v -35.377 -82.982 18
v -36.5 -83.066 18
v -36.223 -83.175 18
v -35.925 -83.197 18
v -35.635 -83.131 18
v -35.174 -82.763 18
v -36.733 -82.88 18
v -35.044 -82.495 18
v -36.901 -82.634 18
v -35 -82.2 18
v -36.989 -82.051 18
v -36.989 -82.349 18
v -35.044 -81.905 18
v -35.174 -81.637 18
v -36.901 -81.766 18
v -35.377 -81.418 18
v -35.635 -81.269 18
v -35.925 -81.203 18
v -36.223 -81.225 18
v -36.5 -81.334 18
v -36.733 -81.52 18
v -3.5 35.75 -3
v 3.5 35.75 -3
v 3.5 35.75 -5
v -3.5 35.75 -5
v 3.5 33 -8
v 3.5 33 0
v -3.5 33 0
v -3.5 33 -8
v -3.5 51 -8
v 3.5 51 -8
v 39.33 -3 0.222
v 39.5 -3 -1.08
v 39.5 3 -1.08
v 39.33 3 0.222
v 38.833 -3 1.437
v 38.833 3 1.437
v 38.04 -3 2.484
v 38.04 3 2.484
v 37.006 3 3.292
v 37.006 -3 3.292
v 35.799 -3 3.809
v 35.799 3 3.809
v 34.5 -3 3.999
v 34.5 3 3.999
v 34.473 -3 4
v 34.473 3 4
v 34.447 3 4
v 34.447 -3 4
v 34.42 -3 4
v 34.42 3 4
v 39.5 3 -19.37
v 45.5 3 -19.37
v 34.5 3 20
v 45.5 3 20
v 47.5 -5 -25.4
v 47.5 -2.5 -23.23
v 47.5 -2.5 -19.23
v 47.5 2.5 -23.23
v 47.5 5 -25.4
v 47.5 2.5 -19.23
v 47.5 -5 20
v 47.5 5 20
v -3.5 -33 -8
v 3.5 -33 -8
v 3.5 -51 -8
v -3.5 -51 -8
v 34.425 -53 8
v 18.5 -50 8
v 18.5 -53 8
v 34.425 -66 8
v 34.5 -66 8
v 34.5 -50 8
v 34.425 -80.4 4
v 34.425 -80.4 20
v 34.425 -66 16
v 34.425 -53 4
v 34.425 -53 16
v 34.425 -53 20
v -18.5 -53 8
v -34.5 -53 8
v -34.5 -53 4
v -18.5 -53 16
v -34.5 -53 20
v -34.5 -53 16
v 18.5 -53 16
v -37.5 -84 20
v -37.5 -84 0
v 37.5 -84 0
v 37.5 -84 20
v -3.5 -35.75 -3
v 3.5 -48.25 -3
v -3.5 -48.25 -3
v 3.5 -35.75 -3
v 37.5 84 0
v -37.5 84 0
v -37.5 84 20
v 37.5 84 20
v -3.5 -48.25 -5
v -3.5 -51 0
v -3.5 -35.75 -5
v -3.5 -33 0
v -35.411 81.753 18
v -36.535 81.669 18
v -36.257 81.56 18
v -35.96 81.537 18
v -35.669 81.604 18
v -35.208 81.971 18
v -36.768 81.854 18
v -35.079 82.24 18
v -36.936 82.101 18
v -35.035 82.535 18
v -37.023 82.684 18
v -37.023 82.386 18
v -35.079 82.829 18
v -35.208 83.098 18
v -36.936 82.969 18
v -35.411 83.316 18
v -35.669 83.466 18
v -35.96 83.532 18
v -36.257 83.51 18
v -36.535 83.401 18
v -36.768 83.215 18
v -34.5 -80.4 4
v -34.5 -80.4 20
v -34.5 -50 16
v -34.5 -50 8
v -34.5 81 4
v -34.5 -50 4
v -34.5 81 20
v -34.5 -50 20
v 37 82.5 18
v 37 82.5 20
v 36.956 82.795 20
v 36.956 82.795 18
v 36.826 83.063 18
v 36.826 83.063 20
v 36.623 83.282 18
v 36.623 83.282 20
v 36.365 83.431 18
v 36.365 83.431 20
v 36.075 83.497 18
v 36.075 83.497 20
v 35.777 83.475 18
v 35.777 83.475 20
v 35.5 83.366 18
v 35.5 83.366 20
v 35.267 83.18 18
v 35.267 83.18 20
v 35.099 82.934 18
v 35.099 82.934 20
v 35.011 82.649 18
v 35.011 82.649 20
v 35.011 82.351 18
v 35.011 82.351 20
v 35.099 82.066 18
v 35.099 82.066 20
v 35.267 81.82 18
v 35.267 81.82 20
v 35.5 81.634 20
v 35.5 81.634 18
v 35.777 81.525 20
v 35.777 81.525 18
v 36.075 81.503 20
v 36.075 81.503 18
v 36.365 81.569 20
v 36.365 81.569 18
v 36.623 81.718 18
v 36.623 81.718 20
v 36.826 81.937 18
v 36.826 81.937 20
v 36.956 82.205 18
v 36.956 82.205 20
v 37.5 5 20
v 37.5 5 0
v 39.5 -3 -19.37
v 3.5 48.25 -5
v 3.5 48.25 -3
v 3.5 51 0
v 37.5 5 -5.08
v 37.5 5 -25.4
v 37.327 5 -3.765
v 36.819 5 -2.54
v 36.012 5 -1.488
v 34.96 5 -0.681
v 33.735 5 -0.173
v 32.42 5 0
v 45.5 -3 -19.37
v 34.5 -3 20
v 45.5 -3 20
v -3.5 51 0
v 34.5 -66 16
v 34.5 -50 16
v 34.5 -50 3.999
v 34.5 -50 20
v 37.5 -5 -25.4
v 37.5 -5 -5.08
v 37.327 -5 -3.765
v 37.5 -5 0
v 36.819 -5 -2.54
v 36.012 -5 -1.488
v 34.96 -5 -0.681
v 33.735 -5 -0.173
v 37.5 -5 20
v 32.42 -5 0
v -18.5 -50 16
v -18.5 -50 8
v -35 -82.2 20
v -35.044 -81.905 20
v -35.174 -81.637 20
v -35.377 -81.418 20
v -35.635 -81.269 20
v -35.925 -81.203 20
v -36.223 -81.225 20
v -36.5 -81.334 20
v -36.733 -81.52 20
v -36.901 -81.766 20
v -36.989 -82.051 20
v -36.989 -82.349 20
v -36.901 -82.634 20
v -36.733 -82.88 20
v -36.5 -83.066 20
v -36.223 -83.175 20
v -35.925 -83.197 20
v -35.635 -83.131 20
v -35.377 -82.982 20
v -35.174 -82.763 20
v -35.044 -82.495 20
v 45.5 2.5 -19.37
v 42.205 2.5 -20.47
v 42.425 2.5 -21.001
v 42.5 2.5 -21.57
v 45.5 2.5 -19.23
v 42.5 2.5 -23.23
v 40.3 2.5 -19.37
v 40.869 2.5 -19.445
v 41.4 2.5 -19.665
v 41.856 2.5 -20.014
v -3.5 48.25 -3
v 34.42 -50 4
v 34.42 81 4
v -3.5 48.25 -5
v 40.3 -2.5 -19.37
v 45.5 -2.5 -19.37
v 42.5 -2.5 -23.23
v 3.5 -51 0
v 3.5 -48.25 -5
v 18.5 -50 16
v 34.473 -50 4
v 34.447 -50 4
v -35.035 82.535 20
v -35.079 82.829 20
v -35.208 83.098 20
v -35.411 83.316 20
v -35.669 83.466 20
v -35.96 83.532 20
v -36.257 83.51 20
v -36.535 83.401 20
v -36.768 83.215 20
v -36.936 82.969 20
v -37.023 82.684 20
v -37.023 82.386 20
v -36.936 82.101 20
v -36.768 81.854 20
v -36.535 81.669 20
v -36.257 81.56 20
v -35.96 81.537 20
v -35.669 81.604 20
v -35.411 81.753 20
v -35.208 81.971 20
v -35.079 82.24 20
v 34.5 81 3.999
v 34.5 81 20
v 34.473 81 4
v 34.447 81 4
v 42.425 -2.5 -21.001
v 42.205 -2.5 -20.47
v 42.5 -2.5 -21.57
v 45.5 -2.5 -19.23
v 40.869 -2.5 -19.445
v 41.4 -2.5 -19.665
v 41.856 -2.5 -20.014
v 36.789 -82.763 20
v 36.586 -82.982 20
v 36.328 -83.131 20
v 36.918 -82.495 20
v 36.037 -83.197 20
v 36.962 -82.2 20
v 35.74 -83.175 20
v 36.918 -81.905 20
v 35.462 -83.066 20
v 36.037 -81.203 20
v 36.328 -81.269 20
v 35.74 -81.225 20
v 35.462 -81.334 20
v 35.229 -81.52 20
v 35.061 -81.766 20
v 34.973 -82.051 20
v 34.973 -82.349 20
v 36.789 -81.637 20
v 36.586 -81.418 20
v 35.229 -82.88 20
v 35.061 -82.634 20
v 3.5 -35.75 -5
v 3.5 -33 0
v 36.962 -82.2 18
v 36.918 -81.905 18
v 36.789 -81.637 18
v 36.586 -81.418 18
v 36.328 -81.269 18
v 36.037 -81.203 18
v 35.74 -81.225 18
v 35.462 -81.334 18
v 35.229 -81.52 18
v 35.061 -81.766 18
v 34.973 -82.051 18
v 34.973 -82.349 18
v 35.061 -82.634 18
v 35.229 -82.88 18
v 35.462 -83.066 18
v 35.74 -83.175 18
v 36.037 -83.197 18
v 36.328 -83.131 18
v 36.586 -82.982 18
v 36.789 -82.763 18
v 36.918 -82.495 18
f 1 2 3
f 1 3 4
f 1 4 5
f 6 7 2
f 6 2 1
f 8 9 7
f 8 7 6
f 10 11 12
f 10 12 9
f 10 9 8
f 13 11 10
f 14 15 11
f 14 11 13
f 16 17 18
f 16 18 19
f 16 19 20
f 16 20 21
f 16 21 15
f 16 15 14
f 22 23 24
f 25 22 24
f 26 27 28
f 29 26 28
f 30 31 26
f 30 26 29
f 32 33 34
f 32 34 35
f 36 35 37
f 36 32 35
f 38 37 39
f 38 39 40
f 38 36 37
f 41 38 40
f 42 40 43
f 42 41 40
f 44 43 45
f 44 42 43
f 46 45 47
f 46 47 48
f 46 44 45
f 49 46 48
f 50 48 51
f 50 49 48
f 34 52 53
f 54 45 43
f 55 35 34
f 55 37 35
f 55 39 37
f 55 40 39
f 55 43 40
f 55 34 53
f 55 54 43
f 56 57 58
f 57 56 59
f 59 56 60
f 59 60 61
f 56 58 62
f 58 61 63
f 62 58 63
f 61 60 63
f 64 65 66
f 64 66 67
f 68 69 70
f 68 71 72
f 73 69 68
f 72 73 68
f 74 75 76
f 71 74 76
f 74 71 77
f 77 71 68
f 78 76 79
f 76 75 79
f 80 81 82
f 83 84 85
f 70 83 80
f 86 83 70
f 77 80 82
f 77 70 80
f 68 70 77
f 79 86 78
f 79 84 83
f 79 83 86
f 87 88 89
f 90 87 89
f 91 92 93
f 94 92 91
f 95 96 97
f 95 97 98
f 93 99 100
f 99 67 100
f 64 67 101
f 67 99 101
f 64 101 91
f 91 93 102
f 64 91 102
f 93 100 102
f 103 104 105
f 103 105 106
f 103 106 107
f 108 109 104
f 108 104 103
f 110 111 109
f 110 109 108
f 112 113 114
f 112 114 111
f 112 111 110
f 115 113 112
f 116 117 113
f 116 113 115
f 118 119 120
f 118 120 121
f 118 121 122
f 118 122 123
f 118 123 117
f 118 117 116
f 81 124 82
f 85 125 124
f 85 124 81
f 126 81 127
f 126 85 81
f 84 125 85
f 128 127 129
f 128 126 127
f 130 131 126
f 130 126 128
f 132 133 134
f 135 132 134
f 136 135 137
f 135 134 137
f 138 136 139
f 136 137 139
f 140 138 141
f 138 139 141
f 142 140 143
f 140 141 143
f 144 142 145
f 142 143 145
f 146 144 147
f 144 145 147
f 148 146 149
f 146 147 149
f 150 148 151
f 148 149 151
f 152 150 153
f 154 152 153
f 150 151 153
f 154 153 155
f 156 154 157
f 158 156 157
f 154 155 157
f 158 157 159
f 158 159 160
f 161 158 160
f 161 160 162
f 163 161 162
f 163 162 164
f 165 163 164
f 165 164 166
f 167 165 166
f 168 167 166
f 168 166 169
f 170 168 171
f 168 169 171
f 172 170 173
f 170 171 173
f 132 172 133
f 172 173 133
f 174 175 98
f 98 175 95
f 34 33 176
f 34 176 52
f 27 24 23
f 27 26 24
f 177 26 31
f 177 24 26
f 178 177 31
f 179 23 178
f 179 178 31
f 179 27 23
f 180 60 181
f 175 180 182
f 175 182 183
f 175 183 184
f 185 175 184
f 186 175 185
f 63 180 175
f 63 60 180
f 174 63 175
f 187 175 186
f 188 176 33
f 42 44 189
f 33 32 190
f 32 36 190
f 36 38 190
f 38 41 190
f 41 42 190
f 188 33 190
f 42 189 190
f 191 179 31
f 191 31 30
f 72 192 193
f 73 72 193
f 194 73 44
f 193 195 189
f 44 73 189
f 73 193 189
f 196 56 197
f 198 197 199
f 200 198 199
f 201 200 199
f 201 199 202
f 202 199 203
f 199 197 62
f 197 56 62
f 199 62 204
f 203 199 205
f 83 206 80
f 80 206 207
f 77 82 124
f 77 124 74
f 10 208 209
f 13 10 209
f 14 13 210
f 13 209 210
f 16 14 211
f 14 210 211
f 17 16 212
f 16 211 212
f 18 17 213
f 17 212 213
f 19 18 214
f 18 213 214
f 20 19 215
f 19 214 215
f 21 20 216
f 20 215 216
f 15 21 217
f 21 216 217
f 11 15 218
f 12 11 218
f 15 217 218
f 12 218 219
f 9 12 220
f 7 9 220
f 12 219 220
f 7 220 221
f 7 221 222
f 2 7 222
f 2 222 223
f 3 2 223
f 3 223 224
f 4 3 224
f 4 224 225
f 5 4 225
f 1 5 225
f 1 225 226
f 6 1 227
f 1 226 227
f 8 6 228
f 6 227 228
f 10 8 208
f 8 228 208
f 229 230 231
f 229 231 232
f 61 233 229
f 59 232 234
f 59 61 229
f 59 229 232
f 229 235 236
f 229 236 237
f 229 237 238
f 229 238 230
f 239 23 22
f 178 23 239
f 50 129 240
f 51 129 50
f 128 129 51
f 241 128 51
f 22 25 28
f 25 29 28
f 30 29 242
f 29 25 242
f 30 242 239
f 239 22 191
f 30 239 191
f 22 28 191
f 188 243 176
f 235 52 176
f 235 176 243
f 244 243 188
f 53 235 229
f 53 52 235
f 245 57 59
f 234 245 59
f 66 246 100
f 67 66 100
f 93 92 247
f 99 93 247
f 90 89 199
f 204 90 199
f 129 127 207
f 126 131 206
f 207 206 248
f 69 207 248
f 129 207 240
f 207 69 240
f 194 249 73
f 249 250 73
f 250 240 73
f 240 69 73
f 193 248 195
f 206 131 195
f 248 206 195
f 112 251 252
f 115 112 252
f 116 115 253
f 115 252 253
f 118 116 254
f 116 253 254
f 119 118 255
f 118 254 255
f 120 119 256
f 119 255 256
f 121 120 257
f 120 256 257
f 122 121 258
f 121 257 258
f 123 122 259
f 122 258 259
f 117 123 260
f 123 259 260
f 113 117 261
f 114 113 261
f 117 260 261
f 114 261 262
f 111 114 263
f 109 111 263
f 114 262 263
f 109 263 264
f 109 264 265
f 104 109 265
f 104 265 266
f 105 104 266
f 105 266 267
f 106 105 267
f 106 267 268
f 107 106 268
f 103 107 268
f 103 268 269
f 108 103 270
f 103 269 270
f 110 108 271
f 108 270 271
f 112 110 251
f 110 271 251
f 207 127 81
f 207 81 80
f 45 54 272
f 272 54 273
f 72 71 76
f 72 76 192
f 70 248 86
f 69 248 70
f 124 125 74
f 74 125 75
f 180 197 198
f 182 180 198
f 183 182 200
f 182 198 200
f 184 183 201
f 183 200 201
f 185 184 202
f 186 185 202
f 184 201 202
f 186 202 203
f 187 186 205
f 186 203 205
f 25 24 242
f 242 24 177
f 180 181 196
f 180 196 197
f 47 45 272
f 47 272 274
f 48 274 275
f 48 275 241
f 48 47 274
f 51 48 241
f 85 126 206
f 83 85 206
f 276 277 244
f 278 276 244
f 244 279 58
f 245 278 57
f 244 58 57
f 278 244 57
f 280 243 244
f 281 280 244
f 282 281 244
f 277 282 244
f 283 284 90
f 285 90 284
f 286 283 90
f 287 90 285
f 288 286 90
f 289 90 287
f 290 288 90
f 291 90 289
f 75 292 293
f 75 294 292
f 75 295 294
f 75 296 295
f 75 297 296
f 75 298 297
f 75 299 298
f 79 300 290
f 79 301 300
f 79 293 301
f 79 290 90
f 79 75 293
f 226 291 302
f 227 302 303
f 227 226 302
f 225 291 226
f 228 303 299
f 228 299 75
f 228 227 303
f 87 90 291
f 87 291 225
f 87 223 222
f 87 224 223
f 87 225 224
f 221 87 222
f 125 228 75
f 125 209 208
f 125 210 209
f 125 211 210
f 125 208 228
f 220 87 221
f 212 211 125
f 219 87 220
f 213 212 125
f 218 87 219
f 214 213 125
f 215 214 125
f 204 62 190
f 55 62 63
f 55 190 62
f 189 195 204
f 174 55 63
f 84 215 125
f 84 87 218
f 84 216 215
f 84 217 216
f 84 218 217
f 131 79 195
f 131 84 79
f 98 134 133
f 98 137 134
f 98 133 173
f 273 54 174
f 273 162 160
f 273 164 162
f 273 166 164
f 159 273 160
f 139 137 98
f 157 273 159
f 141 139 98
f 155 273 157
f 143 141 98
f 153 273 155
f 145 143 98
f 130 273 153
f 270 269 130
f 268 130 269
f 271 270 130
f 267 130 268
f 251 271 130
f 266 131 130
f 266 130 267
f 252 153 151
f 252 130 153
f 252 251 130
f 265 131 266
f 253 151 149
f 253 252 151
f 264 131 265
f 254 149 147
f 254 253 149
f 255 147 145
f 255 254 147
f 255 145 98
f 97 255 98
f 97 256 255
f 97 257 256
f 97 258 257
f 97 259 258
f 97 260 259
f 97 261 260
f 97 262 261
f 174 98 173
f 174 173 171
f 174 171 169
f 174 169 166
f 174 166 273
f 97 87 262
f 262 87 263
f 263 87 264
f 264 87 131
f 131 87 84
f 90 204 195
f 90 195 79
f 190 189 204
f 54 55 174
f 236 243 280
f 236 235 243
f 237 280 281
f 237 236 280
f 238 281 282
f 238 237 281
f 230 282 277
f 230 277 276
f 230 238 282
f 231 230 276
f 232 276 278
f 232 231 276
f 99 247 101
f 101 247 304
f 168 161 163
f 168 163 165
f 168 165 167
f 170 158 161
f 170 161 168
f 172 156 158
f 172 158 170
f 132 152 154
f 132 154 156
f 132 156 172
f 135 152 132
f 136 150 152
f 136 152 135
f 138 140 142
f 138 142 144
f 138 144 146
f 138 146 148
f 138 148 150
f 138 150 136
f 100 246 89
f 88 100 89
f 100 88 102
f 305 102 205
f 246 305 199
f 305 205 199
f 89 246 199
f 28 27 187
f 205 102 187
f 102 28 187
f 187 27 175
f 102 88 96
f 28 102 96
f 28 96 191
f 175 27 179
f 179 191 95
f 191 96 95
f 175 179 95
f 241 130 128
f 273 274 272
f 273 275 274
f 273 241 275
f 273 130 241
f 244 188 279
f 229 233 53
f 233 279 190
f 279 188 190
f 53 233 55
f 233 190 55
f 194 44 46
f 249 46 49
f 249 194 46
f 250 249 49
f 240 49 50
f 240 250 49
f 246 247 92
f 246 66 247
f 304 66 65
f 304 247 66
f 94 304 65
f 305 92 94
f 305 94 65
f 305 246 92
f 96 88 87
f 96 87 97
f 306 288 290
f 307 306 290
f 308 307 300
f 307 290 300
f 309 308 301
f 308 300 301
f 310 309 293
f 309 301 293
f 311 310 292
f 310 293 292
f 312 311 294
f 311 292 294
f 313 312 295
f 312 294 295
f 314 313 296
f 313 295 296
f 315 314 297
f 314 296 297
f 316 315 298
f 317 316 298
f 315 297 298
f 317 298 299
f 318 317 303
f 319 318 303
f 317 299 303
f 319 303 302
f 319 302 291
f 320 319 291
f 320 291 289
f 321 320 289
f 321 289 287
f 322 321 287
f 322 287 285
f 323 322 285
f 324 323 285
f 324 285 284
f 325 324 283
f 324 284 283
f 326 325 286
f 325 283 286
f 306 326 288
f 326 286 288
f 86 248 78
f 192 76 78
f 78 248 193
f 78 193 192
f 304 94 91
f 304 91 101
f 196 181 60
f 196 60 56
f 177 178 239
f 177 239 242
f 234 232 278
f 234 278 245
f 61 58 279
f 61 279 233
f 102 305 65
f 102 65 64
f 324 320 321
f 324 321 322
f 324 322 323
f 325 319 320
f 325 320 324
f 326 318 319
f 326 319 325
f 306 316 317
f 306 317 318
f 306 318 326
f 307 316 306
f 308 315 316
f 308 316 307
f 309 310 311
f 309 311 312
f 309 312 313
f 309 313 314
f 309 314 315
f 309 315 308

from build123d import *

# Parameters (mm, degrees)
SKETCH1_W           = 75
SKETCH1_H           = 168
BOSS_EXTRUDE1_DEPTH = 20
BOSS_EXTRUDE2_DEPTH = 10
SKETCH3_W           = 6
SKETCH3_H           = 6
CUT_EXTRUDE2_DEPTH  = 39.37
SKETCH6_W           = 4
SKETCH6_H           = 5
CUT_EXTRUDE4_DEPTH  = 5
SKETCH7_W           = 69
SKETCH7_H           = 131
CUT_EXTRUDE5_DEPTH  = 16
SKETCH8_W           = 68.924591969
SKETCH8_H           = 27.4
CUT_EXTRUDE6_DEPTH  = 16
SKETCH9_W           = 16
SKETCH9_H           = 8
CUT_EXTRUDE7_DEPTH  = 16
SKETCH11_W          = 7.457157679
SKETCH11_H          = 6
CUT_EXTRUDE8_DEPTH  = 16
BOSS_EXTRUDE3_DEPTH = 10
FILLET4_START       = -3
FILLET4_DEPTH       = 6
FILLET4_START_2     = -50
FILLET4_2_DEPTH     = 131
FILLET5_R           = 2.2
SKETCH13_W          = 7
SKETCH13_H          = 18
BOSS_EXTRUDE4_DEPTH = 8
SKETCH14_W          = 2
SKETCH14_H          = 12.5
CUT_EXTRUDE9_DEPTH  = 99.169037889
SKETCH15_W          = 2
SKETCH15_H          = 12.5
CUT_EXTRUDE10_DEPTH = 99.169037889
SKETCH17_R          = 1
CUT_EXTRUDE11_DEPTH = 2


with BuildPart() as part:
    # Sketch1 → Boss-Extrude1 (new body)
    with BuildSketch(Plane.XY):
        Rectangle(SKETCH1_W, SKETCH1_H)
    extrude(amount=BOSS_EXTRUDE1_DEPTH)

    # Sketch7 → Cut-Extrude5 (cut)
    with BuildSketch(Plane.XY.offset(20)):
        with Locations((0, 15.5)):
            Rectangle(SKETCH7_W, SKETCH7_H)
    extrude(amount=-CUT_EXTRUDE5_DEPTH, mode=Mode.SUBTRACT)

    # Sketch8 → Cut-Extrude6 (cut)
    with BuildSketch(Plane.XY.offset(20)):
        with Locations((-0.037704015, -66.7)):
            Rectangle(SKETCH8_W, SKETCH8_H)
    extrude(amount=-CUT_EXTRUDE6_DEPTH, mode=Mode.SUBTRACT)

    # Sketch9 → Cut-Extrude7 (cut)
    with BuildSketch(Plane(origin=(0, -50, 0), x_dir=(1, 0, 0), z_dir=(0, 1, 0))):
        with Locations((-26.5, -12)):
            Rectangle(SKETCH9_W, SKETCH9_H)
        with Locations((26.5, -12)):
            Rectangle(SKETCH9_W, SKETCH9_H)
    extrude(amount=-CUT_EXTRUDE7_DEPTH, mode=Mode.SUBTRACT)


with BuildPart() as body_2:
    # Sketch2 → Boss-Extrude2 (new body)
    with BuildSketch(Plane(origin=(37.5, 0, 0), x_dir=(0, 0, -1), z_dir=(1, 0, 0))):
        Polygon((0, 5), (25.4, 5), (25.4, -5), (0, -5), (-20, -5), (-20, 5), align=None)
    extrude(amount=BOSS_EXTRUDE2_DEPTH)

    # Sketch3 → Cut-Extrude2 (cut)
    with BuildSketch(Plane.XY.offset(20)):
        with Locations((42.5, 0)):
            Rectangle(SKETCH3_W, SKETCH3_H)
    extrude(amount=-CUT_EXTRUDE2_DEPTH, mode=Mode.SUBTRACT)

    # Sketch6 → Cut-Extrude4 (cut)
    with BuildSketch(Plane(origin=(47.5, 0, 0), x_dir=(0, 0, -1), z_dir=(1, 0, 0))):
        with Locations((21.230369208, 0)):
            Rectangle(SKETCH6_W, SKETCH6_H)
    extrude(amount=-CUT_EXTRUDE4_DEPTH, mode=Mode.SUBTRACT)


with BuildPart() as cut_extrude8_tool:
    # Sketch11 → Cut-Extrude8 (new body)
    with BuildSketch(Plane.XY.offset(20)):
        with Locations((35.77142116, 0)):
            Rectangle(SKETCH11_W, SKETCH11_H)
    extrude(amount=-CUT_EXTRUDE8_DEPTH)


with BuildPart() as part_1:
    add(part.part)

    # Cut-Extrude8: cut by cut_extrude8_tool
    add(cut_extrude8_tool.part, mode=Mode.SUBTRACT)



with BuildPart() as body_2_1:
    add(body_2.part)

    # Cut-Extrude8: cut by cut_extrude8_tool
    add(cut_extrude8_tool.part, mode=Mode.SUBTRACT)


with BuildPart() as part_2:
    add(part_1.part)

    add(body_2_1.part)  # Boss-Extrude3 merges body 2
    # Sketch12 → Boss-Extrude3 (add)
    with BuildSketch(Plane.XZ.offset(5)):
        with BuildLine():
            Line((32.42, 0), (37.5, 0))
            Line((37.5, 0), (37.5, -5.08))
            ThreePointArc((37.5, -5.08), (36.012102448, -1.487897552), (32.42, 0))
        make_face()
    extrude(amount=-BOSS_EXTRUDE3_DEPTH)

    # Fillet4: read off the stored shape, not the designer's step
    # Fillet4 outline → Fillet4 (cut)
    with BuildSketch(Plane(origin=(0, 0, 0), x_dir=(1, 0, 0), z_dir=(0, 1, 0)).offset(FILLET4_START)):
        with BuildLine():
            Line((34.42, -4), (39.5, -4))
            Line((39.5, -4), (39.5, 1.08))
            ThreePointArc((39.5, 1.08), (38.012102448, -2.512102448), (34.42, -4))
        make_face()
    extrude(amount=FILLET4_DEPTH, mode=Mode.SUBTRACT)

    # Fillet4 2 outline → Fillet4 2 (cut)
    with BuildSketch(Plane(origin=(0, 0, 0), x_dir=(1, 0, 0), z_dir=(0, 1, 0)).offset(FILLET4_START_2)):
        with BuildLine():
            ThreePointArc((34.5, -3.99937004), (34.46000124, -3.999842507), (34.42, -4))
            Line((34.42, -4), (34.5, -4))
            Line((34.5, -4), (34.5, -3.99937004))
        make_face()
    extrude(amount=FILLET4_2_DEPTH, mode=Mode.SUBTRACT)

    # Fillet5
    fillet5_edges = [part_2.edges().sort_by_distance(p)[0] for p in [
        (42.5, 0, -19.37),
    ]]
    fillet(fillet5_edges, radius=FILLET5_R)

    # Sketch13 → Boss-Extrude4 (add)
    with BuildSketch(Plane(origin=(0, 0, 0), x_dir=(-1, 0, 0), z_dir=(0, 0, -1))):
        with Locations((0, 42)):
            Rectangle(SKETCH13_W, SKETCH13_H)
        with Locations((0, -42)):
            Rectangle(SKETCH13_W, SKETCH13_H)
    extrude(amount=BOSS_EXTRUDE4_DEPTH)

    # Sketch14 → Cut-Extrude9 (cut, through all)
    with BuildSketch(Plane(origin=(3.5, 0, 0), x_dir=(0, 0, -1), z_dir=(1, 0, 0))):
        with Locations((4, 42)):
            Rectangle(SKETCH14_W, SKETCH14_H)
    extrude(amount=-CUT_EXTRUDE9_DEPTH, mode=Mode.SUBTRACT)

    # Sketch15 → Cut-Extrude10 (cut, through all)
    with BuildSketch(Plane(origin=(3.5, 0, 0), x_dir=(0, 0, -1), z_dir=(1, 0, 0))):
        with Locations((4, -42)):
            Rectangle(SKETCH15_W, SKETCH15_H)
    extrude(amount=-CUT_EXTRUDE10_DEPTH, mode=Mode.SUBTRACT)

    # Sketch17 → Cut-Extrude11 (cut)
    with BuildSketch(Plane.XY.offset(20)):
        with Locations((-36.034629261, 82.534629261)):
            Circle(SKETCH17_R)
        with Locations((36, 82.5)):
            Circle(SKETCH17_R)
        with Locations((35.962295985, -82.2)):
            Circle(SKETCH17_R)
        with Locations((-36, -82.2)):
            Circle(SKETCH17_R)
    extrude(amount=-CUT_EXTRUDE11_DEPTH, mode=Mode.SUBTRACT)


solid = part_2.part
